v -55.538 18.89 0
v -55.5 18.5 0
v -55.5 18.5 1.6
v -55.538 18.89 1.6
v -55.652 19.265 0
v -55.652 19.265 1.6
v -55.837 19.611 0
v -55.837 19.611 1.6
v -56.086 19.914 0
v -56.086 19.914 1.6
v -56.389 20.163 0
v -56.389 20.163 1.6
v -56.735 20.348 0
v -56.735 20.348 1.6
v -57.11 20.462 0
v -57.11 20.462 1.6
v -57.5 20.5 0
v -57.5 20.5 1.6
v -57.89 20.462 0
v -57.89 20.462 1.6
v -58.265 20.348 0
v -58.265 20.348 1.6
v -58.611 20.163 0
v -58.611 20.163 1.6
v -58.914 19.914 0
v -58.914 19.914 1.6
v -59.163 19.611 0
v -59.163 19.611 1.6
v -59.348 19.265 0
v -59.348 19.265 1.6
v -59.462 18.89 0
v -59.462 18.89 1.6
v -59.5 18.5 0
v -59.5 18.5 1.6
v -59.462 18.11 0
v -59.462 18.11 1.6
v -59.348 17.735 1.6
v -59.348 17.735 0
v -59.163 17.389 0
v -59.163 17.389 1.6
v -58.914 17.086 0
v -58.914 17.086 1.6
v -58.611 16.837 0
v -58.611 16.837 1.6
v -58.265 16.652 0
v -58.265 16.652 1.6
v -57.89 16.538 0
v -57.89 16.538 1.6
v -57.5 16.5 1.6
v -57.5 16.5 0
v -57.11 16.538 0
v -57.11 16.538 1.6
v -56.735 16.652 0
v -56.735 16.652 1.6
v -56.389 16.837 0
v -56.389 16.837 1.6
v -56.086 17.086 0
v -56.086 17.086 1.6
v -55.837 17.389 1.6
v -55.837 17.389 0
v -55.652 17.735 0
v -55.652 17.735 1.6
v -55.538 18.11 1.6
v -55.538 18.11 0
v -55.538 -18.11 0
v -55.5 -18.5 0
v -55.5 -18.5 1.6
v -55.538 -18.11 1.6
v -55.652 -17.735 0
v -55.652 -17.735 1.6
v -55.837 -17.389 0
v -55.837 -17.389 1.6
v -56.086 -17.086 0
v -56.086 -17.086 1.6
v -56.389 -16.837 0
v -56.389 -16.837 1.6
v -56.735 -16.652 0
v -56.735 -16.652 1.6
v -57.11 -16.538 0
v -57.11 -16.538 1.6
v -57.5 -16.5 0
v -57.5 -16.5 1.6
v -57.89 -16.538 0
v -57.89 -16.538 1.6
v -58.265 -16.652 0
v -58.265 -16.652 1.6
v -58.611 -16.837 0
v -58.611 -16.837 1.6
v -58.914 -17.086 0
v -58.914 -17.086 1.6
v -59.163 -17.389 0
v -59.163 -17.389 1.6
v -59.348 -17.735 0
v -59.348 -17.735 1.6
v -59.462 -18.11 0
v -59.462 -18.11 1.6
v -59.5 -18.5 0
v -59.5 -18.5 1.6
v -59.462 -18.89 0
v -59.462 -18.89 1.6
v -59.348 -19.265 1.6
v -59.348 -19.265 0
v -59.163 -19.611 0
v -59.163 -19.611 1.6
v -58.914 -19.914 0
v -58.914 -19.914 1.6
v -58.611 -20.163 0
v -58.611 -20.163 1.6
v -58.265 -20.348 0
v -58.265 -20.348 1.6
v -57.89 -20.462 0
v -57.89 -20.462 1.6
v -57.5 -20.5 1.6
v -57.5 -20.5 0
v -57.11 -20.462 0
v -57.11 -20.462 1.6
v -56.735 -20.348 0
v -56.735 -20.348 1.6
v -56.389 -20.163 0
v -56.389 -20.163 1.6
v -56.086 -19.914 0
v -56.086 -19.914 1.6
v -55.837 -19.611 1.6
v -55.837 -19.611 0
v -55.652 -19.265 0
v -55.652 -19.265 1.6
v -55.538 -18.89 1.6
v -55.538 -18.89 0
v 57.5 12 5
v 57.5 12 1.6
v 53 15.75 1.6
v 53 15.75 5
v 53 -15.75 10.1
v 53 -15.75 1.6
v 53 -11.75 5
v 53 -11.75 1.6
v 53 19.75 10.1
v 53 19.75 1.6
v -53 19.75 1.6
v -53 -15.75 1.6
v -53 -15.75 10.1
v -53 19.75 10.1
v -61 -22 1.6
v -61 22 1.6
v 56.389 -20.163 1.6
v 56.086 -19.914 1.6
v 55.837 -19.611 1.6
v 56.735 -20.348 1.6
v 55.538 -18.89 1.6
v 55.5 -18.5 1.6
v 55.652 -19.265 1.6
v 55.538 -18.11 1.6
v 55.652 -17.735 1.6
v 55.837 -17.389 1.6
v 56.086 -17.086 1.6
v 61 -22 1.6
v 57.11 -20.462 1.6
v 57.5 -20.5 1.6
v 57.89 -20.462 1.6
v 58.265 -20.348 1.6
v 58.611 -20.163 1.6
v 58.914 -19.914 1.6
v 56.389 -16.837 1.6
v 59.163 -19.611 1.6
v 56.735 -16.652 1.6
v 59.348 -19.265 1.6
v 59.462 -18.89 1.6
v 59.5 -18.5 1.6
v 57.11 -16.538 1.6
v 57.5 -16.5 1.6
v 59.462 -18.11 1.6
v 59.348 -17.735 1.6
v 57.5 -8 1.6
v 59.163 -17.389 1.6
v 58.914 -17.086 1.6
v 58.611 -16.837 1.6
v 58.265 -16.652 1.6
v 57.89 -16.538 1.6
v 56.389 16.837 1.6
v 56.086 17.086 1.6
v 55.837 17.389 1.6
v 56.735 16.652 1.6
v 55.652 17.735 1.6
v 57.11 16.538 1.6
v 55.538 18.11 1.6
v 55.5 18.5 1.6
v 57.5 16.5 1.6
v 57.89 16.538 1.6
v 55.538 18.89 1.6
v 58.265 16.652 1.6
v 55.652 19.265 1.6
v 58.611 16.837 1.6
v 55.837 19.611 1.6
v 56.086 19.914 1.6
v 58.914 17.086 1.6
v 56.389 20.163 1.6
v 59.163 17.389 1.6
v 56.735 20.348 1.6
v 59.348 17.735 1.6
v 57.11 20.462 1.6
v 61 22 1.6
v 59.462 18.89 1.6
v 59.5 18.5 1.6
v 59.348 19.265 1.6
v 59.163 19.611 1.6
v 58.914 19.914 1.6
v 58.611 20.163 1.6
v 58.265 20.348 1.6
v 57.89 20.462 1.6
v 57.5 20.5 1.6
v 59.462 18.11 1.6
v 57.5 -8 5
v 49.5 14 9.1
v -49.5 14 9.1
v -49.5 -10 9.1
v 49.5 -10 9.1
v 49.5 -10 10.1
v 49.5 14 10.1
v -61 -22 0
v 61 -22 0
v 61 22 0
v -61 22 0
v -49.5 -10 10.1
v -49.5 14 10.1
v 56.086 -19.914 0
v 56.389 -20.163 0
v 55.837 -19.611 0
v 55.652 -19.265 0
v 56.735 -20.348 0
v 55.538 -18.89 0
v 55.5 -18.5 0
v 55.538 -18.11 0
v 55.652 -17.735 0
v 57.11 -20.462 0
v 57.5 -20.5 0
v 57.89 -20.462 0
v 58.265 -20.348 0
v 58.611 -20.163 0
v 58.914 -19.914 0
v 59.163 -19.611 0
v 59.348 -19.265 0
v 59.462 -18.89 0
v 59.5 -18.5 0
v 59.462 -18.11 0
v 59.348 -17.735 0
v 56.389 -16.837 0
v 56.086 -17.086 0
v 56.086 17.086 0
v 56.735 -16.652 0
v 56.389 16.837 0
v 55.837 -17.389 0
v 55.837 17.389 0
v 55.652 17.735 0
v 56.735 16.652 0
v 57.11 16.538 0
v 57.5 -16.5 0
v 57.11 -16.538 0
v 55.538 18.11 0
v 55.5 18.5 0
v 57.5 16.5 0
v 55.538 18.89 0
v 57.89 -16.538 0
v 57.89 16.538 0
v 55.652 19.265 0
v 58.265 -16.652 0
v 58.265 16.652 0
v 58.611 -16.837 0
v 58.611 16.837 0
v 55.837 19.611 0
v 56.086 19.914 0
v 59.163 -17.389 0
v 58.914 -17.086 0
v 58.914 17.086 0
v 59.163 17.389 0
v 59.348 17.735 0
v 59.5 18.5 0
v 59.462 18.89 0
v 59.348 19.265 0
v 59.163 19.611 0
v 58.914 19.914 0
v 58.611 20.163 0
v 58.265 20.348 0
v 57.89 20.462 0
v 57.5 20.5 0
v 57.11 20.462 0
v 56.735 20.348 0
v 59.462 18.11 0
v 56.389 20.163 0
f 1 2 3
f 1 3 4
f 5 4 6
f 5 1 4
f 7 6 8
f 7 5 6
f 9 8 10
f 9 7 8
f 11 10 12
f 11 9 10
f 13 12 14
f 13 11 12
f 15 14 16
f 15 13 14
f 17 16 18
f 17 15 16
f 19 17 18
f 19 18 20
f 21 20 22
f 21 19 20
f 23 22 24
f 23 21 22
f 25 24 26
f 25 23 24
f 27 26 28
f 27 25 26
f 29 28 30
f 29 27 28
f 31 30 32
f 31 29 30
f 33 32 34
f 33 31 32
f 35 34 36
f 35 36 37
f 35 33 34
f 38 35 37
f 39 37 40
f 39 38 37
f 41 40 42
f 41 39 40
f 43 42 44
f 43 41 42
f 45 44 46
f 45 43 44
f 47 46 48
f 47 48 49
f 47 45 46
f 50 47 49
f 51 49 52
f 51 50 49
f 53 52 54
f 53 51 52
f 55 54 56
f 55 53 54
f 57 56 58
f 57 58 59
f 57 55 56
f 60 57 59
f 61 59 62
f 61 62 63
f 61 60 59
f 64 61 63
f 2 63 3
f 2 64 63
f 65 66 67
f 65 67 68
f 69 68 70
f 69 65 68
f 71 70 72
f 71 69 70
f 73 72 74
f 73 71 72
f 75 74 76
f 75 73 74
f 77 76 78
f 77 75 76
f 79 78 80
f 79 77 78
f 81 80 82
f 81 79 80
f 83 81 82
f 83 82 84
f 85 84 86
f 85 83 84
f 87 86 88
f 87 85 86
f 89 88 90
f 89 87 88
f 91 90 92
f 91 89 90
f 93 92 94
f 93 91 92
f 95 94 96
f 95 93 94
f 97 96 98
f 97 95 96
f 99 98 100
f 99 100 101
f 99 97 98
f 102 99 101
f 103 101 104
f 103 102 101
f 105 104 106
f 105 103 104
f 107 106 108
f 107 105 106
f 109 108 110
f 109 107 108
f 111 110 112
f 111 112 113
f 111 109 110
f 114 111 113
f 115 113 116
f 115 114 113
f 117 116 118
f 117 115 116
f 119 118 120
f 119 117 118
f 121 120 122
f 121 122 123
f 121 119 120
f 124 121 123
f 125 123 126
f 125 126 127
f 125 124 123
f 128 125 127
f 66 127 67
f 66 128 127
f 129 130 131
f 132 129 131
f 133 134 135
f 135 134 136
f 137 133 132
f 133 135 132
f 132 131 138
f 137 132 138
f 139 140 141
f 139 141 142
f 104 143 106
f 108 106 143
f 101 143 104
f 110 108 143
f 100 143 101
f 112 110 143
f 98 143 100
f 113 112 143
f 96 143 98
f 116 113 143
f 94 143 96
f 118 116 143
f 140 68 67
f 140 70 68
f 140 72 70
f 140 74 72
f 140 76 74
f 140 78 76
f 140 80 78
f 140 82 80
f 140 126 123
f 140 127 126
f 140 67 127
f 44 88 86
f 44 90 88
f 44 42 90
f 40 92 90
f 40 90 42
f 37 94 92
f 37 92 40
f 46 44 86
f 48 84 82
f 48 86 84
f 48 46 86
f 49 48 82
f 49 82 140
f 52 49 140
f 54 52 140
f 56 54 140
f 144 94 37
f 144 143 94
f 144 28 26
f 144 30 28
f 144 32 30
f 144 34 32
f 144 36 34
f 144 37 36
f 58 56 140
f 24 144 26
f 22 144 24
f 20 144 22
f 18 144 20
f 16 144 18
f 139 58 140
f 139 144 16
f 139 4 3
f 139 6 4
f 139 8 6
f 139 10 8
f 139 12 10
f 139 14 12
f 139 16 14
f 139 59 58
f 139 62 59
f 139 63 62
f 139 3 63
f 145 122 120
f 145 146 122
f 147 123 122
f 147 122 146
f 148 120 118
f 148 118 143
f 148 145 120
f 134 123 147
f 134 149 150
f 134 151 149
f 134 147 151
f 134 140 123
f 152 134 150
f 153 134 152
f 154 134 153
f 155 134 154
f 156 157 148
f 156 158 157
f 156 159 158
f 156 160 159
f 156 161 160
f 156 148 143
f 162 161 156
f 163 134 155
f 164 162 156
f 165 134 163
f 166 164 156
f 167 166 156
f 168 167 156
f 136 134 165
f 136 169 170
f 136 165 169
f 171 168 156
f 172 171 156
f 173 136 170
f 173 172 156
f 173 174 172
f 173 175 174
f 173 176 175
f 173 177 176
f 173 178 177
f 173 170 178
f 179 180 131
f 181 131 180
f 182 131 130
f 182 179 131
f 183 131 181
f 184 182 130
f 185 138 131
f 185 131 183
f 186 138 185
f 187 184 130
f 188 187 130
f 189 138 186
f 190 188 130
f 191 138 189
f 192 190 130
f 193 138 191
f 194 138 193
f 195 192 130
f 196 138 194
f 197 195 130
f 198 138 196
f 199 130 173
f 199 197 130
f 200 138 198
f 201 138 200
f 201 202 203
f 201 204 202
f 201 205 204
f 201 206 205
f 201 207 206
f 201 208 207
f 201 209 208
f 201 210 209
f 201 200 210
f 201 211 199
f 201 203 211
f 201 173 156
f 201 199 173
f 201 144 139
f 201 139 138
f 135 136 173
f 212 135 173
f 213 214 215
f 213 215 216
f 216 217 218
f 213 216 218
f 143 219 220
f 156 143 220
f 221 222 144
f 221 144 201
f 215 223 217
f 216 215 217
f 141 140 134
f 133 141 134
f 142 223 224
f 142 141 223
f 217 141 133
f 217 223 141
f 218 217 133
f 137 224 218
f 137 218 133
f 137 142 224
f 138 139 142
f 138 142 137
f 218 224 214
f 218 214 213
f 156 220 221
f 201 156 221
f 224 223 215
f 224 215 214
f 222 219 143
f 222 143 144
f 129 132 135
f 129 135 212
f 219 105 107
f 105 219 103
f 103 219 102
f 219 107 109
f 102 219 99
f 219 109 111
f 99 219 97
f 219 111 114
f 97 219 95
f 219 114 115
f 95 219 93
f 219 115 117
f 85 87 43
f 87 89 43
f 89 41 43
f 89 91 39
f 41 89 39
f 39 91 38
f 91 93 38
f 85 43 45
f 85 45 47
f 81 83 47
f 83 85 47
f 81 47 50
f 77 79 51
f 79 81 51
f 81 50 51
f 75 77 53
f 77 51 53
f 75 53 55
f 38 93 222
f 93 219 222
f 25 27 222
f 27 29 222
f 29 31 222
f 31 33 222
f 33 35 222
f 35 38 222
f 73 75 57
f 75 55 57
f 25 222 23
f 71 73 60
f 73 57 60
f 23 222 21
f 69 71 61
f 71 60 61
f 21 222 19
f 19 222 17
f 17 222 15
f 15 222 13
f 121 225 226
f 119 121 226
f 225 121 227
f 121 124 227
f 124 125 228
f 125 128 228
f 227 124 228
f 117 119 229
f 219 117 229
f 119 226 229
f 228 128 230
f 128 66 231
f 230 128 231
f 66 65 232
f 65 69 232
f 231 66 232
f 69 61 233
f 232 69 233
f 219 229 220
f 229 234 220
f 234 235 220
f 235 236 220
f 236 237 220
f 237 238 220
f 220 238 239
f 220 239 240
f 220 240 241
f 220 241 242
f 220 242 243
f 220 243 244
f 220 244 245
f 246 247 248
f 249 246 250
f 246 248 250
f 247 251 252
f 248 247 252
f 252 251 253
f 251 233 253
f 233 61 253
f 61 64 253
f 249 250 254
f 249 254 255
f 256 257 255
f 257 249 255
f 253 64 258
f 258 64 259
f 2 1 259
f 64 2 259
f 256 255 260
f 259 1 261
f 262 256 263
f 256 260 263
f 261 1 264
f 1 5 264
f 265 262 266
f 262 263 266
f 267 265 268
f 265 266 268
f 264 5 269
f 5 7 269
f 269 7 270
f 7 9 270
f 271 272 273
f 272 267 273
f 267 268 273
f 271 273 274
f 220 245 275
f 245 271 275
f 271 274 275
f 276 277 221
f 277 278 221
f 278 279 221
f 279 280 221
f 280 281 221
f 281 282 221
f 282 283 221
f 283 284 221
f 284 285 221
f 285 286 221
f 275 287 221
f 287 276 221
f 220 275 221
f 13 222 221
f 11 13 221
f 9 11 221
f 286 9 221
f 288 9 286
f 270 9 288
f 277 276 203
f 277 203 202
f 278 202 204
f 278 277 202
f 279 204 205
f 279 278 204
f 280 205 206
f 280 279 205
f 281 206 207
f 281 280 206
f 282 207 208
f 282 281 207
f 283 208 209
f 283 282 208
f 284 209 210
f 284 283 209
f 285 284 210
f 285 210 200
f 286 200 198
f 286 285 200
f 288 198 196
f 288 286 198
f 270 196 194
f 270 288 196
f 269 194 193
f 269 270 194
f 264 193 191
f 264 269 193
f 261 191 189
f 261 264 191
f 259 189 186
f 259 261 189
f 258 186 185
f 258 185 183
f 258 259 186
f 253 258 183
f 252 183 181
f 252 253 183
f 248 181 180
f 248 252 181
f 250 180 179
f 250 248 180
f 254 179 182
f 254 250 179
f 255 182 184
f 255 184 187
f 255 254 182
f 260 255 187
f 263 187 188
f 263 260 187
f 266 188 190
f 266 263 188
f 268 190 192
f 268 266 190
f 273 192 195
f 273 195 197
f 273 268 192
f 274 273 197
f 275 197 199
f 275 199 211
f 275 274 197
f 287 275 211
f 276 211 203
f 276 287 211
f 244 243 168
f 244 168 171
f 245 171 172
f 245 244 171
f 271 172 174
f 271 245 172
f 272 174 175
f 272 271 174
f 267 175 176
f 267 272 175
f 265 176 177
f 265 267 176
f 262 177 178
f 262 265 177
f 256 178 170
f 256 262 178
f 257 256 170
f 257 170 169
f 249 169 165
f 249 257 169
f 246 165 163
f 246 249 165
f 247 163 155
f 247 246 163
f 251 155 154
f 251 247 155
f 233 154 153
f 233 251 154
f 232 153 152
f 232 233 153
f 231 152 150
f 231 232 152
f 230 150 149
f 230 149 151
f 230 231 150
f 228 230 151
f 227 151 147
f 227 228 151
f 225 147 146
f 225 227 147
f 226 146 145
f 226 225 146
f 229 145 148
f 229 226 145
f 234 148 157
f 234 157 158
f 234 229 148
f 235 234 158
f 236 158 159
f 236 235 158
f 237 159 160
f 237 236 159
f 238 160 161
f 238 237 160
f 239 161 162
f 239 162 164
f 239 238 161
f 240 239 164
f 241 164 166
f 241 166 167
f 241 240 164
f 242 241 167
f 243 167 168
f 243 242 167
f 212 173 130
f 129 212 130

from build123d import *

# Parameters (mm, degrees)
SKETCH1_W           = 122
SKETCH1_H           = 44
SKETCH1_R           = 2
BOSS_EXTRUDE1_DEPTH = 1.6
SKETCH2_W           = 106
SKETCH2_H           = 35.5
BOSS_EXTRUDE2_DEPTH = 8.5
SKETCH4_W           = 99
SKETCH4_H           = 24
CUT_EXTRUDE1_DEPTH  = 1
BOSS_EXTRUDE3_DEPTH = 3.4


with BuildPart() as part:
    # Sketch1 → Boss-Extrude1 (new body)
    with BuildSketch(Plane.XY):
        Rectangle(SKETCH1_W, SKETCH1_H)
        with Locations((-57.5, 18.5)):
            Circle(SKETCH1_R, mode=Mode.SUBTRACT)
        with Locations((-57.5, -18.5)):
            Circle(SKETCH1_R, mode=Mode.SUBTRACT)
        with Locations((57.5, 18.5)):
            Circle(SKETCH1_R, mode=Mode.SUBTRACT)
        with Locations((57.5, -18.5)):
            Circle(SKETCH1_R, mode=Mode.SUBTRACT)
    extrude(amount=BOSS_EXTRUDE1_DEPTH)

    # Sketch2 → Boss-Extrude2 (add)
    with BuildSketch(Plane.XY.offset(1.6)):
        with Locations((0, 2)):
            Rectangle(SKETCH2_W, SKETCH2_H)
    extrude(amount=BOSS_EXTRUDE2_DEPTH)

    # Sketch4 → Cut-Extrude1 (cut)
    with BuildSketch(Plane.XY.offset(10.1)):
        with Locations((0, 2)):
            Rectangle(SKETCH4_W, SKETCH4_H)
    extrude(amount=-CUT_EXTRUDE1_DEPTH, mode=Mode.SUBTRACT)

    # Sketch5 → Boss-Extrude3 (add)
    with BuildSketch(Plane.XY.offset(1.6)):
        Polygon((53, 15.75), (53, -11.75), (57.5, -8), (57.5, 12), align=None)
    extrude(amount=BOSS_EXTRUDE3_DEPTH)


solid = part.part
